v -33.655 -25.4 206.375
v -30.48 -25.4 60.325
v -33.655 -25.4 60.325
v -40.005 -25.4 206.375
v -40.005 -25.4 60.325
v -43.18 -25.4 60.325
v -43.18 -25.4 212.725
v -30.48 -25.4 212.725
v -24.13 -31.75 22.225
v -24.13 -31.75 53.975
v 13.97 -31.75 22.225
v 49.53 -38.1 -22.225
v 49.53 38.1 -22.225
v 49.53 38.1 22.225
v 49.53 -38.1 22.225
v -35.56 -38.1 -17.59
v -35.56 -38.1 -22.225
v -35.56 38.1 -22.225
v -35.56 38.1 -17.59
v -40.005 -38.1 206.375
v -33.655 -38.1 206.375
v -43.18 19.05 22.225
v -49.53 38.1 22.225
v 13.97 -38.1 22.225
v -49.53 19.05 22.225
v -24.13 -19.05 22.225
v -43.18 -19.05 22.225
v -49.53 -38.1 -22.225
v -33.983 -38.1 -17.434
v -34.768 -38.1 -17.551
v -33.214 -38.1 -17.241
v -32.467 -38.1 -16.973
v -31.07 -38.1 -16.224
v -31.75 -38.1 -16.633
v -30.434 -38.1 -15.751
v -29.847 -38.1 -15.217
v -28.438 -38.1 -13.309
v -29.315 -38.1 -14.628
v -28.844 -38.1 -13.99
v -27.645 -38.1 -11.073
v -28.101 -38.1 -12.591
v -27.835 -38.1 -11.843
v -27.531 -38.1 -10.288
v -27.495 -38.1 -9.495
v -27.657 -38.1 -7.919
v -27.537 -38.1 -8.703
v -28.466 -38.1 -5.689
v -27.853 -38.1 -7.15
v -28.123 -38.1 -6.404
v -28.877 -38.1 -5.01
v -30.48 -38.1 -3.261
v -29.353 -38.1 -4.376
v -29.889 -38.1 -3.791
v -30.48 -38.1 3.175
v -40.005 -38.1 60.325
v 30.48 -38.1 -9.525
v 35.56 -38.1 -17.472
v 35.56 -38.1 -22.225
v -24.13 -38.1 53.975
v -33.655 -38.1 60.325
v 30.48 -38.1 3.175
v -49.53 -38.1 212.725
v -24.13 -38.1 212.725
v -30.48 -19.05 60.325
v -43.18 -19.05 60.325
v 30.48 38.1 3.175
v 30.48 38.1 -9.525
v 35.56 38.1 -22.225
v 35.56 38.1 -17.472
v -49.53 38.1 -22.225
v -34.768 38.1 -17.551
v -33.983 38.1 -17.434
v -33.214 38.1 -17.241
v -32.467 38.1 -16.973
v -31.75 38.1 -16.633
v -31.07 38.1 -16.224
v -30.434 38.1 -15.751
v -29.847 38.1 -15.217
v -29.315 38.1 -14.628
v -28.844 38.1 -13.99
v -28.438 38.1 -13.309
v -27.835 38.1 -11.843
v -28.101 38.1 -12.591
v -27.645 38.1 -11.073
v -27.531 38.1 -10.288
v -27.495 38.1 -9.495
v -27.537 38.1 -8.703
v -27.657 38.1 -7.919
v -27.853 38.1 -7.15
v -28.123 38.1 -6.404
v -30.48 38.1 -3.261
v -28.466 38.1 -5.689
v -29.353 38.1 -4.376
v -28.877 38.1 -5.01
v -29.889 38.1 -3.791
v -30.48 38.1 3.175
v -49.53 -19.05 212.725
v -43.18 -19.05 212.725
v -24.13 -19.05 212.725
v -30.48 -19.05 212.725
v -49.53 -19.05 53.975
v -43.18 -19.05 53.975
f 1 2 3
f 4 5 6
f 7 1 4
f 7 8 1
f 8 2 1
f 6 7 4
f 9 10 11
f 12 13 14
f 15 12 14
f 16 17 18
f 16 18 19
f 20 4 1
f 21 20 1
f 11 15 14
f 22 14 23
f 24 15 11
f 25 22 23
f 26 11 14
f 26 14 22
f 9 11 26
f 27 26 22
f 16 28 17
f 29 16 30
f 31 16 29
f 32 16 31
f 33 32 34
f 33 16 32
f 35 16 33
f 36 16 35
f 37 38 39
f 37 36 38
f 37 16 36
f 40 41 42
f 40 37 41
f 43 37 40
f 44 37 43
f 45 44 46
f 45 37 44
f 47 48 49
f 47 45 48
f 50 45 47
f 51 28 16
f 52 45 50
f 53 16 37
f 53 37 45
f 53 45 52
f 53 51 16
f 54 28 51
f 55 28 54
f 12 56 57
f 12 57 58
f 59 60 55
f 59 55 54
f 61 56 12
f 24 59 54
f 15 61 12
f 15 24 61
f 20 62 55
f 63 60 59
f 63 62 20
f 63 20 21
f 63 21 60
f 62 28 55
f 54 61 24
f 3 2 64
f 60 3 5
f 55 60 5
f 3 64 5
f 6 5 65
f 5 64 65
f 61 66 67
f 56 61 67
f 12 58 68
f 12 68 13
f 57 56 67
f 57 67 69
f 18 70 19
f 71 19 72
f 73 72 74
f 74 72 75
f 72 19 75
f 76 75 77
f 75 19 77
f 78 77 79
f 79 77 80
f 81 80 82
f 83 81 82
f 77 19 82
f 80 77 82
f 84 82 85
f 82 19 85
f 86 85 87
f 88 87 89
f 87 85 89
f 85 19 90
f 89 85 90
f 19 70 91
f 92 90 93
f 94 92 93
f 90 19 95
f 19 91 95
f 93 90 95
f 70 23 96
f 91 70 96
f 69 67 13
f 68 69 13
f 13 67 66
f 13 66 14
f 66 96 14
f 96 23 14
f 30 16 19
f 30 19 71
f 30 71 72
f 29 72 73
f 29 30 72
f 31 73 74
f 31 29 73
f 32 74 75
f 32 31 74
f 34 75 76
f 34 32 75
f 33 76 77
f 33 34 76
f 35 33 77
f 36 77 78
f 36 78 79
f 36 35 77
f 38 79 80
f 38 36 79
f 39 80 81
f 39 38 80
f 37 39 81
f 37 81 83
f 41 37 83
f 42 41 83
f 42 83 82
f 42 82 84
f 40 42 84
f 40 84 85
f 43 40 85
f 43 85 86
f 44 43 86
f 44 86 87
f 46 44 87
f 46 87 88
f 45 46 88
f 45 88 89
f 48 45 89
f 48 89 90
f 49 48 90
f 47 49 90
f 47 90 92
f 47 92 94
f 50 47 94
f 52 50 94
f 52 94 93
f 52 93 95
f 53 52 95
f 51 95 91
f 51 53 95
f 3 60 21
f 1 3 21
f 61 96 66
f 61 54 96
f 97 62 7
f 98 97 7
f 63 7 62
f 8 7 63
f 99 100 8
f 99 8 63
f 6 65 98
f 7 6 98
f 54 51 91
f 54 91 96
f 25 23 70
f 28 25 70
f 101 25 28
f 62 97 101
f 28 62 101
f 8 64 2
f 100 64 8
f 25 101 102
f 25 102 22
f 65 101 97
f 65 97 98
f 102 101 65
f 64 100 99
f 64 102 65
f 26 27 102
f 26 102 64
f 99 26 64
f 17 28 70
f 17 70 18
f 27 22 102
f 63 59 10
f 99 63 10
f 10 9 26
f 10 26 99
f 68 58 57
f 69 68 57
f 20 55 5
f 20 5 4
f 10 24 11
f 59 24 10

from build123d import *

# Parameters (mm, degrees)
F1_DEPTH  = 38.1
F2_W      = 71.12
F2_H      = 27.3908400369
F3_DEPTH  = 50.8
F4_W      = 25.4
F4_H      = 19.05
F5_DEPTH  = 190.5
F6_W      = 12.7
F6_H      = 152.4
F7_DEPTH  = 6.35
F9_DEPTH  = 6.35
F10_R     = 8.0648205789
F11_DEPTH = 76.2
F13_DEPTH = 76.2
F15_DEPTH = 6.35
F17_DEPTH = 6.35
F18_W     = 6.35
F18_H     = 146.05
F19_DEPTH = 25.4


with BuildPart() as f1:
    # F0 (on Front) → F1 (new body, symmetric)
    with BuildSketch(Plane.XZ):
        Polygon((30.48, -22.225), (49.53, -22.225), (49.53, 22.225), (-49.53, 22.225), (-49.53, -22.225), (-30.48, -22.225), (-30.48, 3.175), (30.48, 3.175), align=None)
    extrude(amount=F1_DEPTH, both=True)

    # F2 (on Front) → F3 (cut, symmetric)
    with BuildSketch(Plane.XZ):
        with Locations((0, -23.2204200185)):
            Rectangle(F2_W, F2_H)
    extrude(amount=F3_DEPTH, both=True, mode=Mode.SUBTRACT)

    # F4 (on face) → F5 (join)
    with BuildSketch(Plane.XY.offset(22.225)):
        with Locations((-36.83, -28.575)):
            Rectangle(F4_W, F4_H)
    extrude(amount=F5_DEPTH)

    # F6 (on face) → F7 (cut)
    with BuildSketch(Plane(origin=(0, -19.05, 0), x_dir=(-1, 0, 0), z_dir=(0, 1, 0))):
        with Locations((36.83, 136.525)):
            Rectangle(F6_W, F6_H)
    extrude(amount=-F7_DEPTH, mode=Mode.SUBTRACT)

    # F8 (on face) → F9 (cut)
    with BuildSketch(Plane(origin=(0, -19.05, 0), x_dir=(-1, 0, 0), z_dir=(0, 1, 0))):
        Polygon((33.655, 200.025), (33.655, 225.425), (20.955, 225.425), (20.955, 200.025), (24.13, 200.025), (24.13, 212.725), (30.48, 212.725), (30.48, 200.025), align=None)
    extrude(amount=-F9_DEPTH, mode=Mode.SUBTRACT)

    # F10 (on face) → F11 (join)
    with BuildSketch(Plane.XZ.offset(38.1)):
        with Locations((-35.56, -9.525)):
            Circle(F10_R)
    extrude(amount=-F11_DEPTH)

    # F12 (on face) → F13 (join)
    with BuildSketch(Plane.XZ.offset(38.1)):
        Polygon((35.56, -17.4720194191), (35.56, -9.525), (30.48, -9.525), align=None)
    extrude(amount=-F13_DEPTH)

    # F14 (on face) → F15 (join)
    with BuildSketch(Plane.XZ.offset(38.1)):
        Polygon((-24.13, 53.975), (-24.13, 22.225), (13.97, 22.225), align=None)
    extrude(amount=-F15_DEPTH)

    # F16 (on face) → F17 (join)
    with BuildSketch(Plane(origin=(-49.53, 0, 0), x_dir=(0, -1, 0), z_dir=(-1, 0, 0))):
        Polygon((-19.05, 22.225), (19.05, 22.225), (19.05, 53.975), align=None)
    extrude(amount=-F17_DEPTH)

    # F18 (on face) → F19 (cut)
    with BuildSketch(Plane.XZ.offset(38.1)):
        with Locations((-36.83, 133.35)):
            Rectangle(F18_W, F18_H)
    extrude(amount=-F19_DEPTH, mode=Mode.SUBTRACT)


solid = f1.part
